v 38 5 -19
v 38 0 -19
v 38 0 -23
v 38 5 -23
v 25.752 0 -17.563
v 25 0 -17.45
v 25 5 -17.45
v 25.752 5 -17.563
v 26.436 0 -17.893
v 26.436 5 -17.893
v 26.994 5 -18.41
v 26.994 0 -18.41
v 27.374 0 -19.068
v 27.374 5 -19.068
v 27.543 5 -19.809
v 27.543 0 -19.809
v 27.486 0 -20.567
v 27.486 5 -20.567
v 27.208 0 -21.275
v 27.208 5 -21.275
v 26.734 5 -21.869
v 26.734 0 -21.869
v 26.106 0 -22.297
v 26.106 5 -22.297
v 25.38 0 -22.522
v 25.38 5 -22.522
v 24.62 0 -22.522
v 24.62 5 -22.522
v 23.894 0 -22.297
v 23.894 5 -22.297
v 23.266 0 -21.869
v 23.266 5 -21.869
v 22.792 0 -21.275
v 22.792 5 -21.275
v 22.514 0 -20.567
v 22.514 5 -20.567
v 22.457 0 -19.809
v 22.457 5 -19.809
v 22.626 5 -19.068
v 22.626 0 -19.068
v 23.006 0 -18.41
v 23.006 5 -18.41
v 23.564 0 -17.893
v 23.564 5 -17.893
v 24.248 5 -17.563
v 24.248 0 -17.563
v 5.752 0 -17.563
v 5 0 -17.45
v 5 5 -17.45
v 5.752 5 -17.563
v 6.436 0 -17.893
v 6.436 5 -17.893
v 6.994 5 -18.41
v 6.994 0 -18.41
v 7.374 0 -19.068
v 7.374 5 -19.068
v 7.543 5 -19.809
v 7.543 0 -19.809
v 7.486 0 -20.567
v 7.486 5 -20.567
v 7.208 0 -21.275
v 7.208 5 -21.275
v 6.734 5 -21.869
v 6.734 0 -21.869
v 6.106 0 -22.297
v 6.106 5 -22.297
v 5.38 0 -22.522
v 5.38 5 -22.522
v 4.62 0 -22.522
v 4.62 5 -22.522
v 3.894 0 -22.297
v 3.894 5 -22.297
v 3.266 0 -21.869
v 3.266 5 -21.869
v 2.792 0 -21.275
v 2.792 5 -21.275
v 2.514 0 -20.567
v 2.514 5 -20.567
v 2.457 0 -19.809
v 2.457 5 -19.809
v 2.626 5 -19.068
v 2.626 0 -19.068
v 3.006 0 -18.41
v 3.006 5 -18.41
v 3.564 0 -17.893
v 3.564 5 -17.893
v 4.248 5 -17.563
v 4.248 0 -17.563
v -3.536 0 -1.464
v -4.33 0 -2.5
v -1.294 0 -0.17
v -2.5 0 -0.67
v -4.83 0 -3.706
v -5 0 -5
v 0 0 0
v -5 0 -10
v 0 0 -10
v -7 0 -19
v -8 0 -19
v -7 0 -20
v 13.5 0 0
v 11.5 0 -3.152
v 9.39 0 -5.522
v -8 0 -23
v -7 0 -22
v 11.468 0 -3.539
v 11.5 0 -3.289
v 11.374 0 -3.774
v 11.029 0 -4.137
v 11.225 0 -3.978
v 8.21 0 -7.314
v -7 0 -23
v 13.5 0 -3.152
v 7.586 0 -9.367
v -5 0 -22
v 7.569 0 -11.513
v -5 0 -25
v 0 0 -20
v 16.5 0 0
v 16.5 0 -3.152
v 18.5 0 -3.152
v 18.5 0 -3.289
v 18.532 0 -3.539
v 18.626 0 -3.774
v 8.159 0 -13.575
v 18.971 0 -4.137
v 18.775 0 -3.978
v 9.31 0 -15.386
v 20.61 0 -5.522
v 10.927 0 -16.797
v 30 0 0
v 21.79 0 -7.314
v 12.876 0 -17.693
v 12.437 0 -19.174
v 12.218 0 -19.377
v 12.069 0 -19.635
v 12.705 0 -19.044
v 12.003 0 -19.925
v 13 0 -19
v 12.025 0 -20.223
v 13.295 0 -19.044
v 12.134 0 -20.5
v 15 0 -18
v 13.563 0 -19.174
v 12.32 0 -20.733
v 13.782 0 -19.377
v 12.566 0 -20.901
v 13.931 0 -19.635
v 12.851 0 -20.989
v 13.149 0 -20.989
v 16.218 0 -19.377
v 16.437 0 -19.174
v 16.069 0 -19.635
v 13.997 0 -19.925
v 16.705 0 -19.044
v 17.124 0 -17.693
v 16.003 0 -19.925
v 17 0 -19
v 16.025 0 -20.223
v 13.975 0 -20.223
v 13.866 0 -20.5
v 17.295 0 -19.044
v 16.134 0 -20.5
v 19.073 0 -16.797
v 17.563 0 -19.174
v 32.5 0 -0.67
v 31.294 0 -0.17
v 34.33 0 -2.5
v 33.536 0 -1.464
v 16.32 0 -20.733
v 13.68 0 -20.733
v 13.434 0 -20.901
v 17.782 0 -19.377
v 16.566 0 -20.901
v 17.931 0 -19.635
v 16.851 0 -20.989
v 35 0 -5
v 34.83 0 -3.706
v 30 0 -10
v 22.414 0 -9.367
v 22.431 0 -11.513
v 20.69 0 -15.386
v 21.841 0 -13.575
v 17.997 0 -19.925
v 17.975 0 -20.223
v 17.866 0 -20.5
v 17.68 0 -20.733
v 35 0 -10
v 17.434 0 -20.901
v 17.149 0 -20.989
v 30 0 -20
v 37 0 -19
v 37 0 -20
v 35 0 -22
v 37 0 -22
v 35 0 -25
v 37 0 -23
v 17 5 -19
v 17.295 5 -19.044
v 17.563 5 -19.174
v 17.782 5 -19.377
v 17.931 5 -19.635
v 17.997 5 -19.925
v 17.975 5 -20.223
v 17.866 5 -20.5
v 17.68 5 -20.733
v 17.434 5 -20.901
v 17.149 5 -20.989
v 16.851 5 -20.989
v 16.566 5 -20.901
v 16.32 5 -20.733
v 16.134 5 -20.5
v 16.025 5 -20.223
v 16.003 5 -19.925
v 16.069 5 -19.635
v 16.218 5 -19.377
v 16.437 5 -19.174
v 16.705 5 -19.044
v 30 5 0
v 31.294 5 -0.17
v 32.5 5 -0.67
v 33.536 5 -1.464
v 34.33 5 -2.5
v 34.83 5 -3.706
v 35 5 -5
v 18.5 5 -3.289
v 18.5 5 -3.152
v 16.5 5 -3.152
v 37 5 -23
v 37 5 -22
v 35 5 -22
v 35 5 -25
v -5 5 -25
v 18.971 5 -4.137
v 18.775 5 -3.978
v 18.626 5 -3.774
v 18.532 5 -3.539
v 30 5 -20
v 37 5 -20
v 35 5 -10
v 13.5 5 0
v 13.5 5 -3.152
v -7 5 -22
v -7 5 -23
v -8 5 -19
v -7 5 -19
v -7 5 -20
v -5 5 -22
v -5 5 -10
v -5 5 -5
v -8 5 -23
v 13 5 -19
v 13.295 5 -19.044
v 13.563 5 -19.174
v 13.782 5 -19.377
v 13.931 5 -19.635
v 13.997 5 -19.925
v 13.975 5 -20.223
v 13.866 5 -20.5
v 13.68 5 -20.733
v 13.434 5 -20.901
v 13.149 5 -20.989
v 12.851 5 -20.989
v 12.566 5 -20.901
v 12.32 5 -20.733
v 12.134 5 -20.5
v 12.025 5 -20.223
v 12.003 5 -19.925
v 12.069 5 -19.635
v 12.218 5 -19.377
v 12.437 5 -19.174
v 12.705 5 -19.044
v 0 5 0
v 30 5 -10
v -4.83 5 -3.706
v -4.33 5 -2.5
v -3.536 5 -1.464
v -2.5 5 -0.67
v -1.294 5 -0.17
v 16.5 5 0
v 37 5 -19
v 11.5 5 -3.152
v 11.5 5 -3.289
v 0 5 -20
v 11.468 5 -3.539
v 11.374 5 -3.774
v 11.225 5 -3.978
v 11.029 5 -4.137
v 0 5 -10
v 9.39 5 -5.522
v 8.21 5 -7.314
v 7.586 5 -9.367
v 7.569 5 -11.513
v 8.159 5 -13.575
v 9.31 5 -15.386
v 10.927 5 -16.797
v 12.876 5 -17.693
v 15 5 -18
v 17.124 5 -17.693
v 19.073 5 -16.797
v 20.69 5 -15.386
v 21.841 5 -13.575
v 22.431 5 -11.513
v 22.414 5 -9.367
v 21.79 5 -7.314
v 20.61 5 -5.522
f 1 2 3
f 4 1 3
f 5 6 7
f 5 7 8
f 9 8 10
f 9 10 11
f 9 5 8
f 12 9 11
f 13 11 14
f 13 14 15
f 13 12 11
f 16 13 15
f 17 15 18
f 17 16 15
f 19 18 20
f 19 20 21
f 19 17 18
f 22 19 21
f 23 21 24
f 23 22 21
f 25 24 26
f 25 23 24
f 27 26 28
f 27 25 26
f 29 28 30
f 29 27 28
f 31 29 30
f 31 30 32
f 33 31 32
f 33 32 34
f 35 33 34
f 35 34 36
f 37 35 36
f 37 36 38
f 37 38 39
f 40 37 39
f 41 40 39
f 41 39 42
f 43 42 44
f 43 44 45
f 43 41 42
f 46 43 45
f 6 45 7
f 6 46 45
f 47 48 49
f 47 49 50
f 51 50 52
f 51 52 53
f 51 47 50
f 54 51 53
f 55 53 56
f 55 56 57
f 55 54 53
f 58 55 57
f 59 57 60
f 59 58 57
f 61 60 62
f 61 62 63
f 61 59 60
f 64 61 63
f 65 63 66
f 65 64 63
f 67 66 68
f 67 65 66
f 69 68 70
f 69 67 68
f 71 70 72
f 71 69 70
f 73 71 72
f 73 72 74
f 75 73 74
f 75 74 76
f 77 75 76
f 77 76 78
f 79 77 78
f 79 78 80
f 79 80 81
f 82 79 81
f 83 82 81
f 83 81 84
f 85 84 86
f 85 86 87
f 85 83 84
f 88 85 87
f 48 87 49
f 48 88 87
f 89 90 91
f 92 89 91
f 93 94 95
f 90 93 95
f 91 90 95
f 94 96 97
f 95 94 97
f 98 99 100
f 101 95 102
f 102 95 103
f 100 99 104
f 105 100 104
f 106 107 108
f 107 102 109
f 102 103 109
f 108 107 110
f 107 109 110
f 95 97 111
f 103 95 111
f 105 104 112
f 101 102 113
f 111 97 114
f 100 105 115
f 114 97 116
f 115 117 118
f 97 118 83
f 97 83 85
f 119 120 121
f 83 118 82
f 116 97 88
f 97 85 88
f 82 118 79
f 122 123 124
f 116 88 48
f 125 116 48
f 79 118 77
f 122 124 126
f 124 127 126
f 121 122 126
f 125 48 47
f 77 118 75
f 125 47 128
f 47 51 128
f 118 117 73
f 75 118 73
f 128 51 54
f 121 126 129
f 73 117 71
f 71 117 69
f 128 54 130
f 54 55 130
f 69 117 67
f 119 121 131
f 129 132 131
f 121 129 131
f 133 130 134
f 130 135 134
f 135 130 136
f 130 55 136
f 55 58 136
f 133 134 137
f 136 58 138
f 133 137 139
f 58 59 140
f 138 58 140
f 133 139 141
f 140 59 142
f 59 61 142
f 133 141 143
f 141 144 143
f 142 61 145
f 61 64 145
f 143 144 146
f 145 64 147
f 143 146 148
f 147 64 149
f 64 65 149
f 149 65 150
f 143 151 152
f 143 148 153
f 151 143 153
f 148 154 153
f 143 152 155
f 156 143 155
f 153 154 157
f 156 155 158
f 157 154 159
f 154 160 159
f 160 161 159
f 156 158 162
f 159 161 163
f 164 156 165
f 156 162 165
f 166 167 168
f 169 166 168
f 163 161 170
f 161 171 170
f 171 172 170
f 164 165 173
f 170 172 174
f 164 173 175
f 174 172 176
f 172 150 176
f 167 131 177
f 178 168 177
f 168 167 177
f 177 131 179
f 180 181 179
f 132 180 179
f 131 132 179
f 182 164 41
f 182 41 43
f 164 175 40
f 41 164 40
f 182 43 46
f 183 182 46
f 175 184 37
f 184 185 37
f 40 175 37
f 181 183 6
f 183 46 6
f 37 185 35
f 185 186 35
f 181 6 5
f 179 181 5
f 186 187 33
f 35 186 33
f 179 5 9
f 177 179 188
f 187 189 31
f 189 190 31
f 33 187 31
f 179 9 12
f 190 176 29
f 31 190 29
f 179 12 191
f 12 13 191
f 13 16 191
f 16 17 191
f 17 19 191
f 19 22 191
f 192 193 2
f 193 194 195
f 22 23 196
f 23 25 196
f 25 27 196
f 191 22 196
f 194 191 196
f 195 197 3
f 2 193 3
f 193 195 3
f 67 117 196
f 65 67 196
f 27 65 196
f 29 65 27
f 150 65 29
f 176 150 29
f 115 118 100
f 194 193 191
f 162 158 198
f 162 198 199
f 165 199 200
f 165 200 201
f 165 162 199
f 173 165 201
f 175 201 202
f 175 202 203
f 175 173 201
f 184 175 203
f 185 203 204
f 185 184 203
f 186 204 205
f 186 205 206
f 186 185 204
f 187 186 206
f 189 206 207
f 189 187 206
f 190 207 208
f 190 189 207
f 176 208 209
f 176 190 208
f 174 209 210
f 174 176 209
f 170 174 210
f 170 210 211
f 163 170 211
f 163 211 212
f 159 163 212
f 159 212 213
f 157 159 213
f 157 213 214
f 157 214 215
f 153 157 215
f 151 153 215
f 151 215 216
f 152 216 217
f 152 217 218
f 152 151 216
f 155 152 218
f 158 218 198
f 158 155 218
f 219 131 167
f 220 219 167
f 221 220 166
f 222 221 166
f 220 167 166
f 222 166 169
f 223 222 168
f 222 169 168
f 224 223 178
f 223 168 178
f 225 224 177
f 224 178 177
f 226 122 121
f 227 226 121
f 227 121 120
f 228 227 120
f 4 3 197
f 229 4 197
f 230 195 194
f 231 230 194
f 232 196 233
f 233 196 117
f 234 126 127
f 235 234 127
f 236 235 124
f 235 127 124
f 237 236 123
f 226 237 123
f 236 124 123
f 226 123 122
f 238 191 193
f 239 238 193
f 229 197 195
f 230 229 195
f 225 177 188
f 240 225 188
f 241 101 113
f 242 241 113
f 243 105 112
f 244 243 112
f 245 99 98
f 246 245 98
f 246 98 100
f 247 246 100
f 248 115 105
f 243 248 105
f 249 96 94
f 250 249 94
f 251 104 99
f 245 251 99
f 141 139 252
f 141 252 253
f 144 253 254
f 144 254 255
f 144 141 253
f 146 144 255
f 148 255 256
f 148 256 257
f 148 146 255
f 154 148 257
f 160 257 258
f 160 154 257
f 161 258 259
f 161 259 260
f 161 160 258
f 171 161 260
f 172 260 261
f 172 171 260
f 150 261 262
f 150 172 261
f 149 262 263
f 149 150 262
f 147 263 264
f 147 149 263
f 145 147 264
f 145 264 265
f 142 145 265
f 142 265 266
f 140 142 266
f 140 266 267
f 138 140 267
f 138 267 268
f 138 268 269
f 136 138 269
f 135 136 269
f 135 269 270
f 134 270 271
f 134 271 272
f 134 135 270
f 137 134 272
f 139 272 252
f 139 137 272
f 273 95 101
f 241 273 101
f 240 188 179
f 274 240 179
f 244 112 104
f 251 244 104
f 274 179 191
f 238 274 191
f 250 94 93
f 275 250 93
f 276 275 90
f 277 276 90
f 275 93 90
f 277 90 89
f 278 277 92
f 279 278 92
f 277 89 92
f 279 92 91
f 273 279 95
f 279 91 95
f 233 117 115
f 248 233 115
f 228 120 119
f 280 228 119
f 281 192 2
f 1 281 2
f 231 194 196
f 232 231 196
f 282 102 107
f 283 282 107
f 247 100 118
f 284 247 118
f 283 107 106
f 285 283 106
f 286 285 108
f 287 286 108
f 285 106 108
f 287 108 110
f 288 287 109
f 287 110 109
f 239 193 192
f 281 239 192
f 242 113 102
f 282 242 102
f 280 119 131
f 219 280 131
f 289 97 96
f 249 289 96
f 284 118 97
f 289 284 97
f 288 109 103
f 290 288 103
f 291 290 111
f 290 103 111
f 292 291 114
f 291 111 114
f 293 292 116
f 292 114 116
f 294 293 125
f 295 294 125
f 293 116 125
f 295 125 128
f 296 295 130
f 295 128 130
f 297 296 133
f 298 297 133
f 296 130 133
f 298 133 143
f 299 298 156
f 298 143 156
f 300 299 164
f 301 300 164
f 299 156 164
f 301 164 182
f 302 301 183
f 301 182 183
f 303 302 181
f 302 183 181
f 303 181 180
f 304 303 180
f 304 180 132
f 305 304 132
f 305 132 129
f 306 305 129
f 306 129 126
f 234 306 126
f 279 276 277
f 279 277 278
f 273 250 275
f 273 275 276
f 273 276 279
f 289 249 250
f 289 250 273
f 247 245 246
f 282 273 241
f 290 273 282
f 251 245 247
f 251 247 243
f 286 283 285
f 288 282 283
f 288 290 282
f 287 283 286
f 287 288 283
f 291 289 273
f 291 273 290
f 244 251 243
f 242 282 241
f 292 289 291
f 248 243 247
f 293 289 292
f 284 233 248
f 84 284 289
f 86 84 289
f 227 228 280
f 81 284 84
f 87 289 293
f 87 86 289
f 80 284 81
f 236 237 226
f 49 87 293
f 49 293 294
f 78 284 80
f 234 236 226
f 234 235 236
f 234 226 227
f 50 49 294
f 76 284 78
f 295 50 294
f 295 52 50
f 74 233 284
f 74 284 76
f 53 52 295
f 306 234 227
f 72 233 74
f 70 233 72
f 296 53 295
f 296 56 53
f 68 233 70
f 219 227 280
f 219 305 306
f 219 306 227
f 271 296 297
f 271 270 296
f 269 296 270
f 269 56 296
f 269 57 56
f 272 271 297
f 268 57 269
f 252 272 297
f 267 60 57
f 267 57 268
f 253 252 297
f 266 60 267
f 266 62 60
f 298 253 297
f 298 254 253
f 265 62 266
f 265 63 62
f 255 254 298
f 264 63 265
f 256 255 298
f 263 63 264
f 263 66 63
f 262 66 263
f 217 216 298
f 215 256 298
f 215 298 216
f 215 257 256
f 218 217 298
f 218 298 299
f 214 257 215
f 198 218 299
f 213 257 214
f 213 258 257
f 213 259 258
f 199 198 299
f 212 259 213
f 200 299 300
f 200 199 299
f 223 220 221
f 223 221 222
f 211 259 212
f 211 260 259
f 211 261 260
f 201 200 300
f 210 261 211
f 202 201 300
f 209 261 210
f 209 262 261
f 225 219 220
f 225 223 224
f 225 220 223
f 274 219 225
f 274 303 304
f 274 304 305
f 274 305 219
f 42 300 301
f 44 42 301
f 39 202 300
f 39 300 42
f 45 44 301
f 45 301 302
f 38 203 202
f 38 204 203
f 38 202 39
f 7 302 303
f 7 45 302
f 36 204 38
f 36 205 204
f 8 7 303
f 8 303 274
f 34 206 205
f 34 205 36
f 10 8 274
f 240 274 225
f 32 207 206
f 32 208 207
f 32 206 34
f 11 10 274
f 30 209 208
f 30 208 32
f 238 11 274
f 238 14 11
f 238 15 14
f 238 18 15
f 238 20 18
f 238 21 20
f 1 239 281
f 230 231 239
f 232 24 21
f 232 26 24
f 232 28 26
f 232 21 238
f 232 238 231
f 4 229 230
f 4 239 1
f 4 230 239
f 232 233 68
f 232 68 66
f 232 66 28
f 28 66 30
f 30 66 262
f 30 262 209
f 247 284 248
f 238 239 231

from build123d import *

# Parameters (mm, degrees)
SKETCH_1_R      = 2.55
SKETCH_1_R_2    = 1
EXTRUDE_1_DEPTH = 5


with BuildPart() as part:
    # 草图1 → 凸台-拉伸1 (new body)
    with BuildSketch(Plane(origin=(0, 0, 0), x_dir=(1, 0, 0), z_dir=(0, 1, 0))):
        with BuildLine():
            Line((35, 20), (37, 20))
            Line((37, 20), (37, 19))
            Line((37, 19), (38, 19))
            Line((38, 19), (38, 23))
            Line((38, 23), (37, 23))
            Line((37, 23), (37, 22))
            Line((37, 22), (35, 22))
            Line((35, 22), (35, 25))
            Line((35, 25), (30, 25))
            Line((30, 25), (20, 25))
            Line((20, 25), (10, 25))
            Line((10, 25), (0, 25))
            Line((0, 25), (-5, 25))
            Line((-5, 25), (-5, 22))
            Line((-5, 22), (-7, 22))
            Line((-7, 22), (-7, 23))
            Line((-7, 23), (-8, 23))
            Line((-8, 23), (-8, 19))
            Line((-8, 19), (-7, 19))
            Line((-7, 19), (-7, 20))
            Line((-7, 20), (-5, 20))
            Line((-5, 20), (0, 20))
            Line((0, 20), (0, 10))
            Line((0, 10), (-5, 10))
            Line((-5, 10), (-5, 5))
            ThreePointArc((-5, 5), (-3.535533906, 1.464466094), (0, 0))
            Line((0, 0), (5, 0))
            Line((5, 0), (13.5, 0))
            Line((13.5, 0), (13.5, 3.151530772))
            Line((13.5, 3.151530772), (11.5, 3.151530772))
            Line((11.5, 3.151530772), (11.5, 3.288897449))
            ThreePointArc((11.5, 3.288897449), (11.374474632, 3.773968699), (11.029411765, 4.137262455))
            ThreePointArc((11.029411765, 4.137262455), (15, 18), (18.970588235, 4.137262455))
            ThreePointArc((18.970588235, 4.137262455), (18.625525368, 3.773968699), (18.5, 3.288897449))
            Line((18.5, 3.288897449), (18.5, 3.151530772))
            Line((18.5, 3.151530772), (16.5, 3.151530772))
            Line((16.5, 3.151530772), (16.5, 0))
            Line((16.5, 0), (25, 0))
            Line((25, 0), (30, 0))
            ThreePointArc((30, 0), (33.535533906, 1.464466094), (35, 5))
            Line((35, 5), (35, 10))
            Line((35, 10), (30, 10))
            Line((30, 10), (30, 20))
            Line((30, 20), (35, 20))
        make_face()
        with Locations(Location((5, 20, 0), (0, 0, 270))):
            Circle(SKETCH_1_R, mode=Mode.SUBTRACT)
        with Locations(Location((25, 20, 0), (0, 0, 270))):
            Circle(SKETCH_1_R, mode=Mode.SUBTRACT)
        with Locations(Location((13, 20, 0), (0, 0, 270))):
            Circle(SKETCH_1_R_2, mode=Mode.SUBTRACT)
        with Locations(Location((17, 20, 0), (0, 0, 270))):
            Circle(SKETCH_1_R_2, mode=Mode.SUBTRACT)
    extrude(amount=EXTRUDE_1_DEPTH)


solid = part.part
